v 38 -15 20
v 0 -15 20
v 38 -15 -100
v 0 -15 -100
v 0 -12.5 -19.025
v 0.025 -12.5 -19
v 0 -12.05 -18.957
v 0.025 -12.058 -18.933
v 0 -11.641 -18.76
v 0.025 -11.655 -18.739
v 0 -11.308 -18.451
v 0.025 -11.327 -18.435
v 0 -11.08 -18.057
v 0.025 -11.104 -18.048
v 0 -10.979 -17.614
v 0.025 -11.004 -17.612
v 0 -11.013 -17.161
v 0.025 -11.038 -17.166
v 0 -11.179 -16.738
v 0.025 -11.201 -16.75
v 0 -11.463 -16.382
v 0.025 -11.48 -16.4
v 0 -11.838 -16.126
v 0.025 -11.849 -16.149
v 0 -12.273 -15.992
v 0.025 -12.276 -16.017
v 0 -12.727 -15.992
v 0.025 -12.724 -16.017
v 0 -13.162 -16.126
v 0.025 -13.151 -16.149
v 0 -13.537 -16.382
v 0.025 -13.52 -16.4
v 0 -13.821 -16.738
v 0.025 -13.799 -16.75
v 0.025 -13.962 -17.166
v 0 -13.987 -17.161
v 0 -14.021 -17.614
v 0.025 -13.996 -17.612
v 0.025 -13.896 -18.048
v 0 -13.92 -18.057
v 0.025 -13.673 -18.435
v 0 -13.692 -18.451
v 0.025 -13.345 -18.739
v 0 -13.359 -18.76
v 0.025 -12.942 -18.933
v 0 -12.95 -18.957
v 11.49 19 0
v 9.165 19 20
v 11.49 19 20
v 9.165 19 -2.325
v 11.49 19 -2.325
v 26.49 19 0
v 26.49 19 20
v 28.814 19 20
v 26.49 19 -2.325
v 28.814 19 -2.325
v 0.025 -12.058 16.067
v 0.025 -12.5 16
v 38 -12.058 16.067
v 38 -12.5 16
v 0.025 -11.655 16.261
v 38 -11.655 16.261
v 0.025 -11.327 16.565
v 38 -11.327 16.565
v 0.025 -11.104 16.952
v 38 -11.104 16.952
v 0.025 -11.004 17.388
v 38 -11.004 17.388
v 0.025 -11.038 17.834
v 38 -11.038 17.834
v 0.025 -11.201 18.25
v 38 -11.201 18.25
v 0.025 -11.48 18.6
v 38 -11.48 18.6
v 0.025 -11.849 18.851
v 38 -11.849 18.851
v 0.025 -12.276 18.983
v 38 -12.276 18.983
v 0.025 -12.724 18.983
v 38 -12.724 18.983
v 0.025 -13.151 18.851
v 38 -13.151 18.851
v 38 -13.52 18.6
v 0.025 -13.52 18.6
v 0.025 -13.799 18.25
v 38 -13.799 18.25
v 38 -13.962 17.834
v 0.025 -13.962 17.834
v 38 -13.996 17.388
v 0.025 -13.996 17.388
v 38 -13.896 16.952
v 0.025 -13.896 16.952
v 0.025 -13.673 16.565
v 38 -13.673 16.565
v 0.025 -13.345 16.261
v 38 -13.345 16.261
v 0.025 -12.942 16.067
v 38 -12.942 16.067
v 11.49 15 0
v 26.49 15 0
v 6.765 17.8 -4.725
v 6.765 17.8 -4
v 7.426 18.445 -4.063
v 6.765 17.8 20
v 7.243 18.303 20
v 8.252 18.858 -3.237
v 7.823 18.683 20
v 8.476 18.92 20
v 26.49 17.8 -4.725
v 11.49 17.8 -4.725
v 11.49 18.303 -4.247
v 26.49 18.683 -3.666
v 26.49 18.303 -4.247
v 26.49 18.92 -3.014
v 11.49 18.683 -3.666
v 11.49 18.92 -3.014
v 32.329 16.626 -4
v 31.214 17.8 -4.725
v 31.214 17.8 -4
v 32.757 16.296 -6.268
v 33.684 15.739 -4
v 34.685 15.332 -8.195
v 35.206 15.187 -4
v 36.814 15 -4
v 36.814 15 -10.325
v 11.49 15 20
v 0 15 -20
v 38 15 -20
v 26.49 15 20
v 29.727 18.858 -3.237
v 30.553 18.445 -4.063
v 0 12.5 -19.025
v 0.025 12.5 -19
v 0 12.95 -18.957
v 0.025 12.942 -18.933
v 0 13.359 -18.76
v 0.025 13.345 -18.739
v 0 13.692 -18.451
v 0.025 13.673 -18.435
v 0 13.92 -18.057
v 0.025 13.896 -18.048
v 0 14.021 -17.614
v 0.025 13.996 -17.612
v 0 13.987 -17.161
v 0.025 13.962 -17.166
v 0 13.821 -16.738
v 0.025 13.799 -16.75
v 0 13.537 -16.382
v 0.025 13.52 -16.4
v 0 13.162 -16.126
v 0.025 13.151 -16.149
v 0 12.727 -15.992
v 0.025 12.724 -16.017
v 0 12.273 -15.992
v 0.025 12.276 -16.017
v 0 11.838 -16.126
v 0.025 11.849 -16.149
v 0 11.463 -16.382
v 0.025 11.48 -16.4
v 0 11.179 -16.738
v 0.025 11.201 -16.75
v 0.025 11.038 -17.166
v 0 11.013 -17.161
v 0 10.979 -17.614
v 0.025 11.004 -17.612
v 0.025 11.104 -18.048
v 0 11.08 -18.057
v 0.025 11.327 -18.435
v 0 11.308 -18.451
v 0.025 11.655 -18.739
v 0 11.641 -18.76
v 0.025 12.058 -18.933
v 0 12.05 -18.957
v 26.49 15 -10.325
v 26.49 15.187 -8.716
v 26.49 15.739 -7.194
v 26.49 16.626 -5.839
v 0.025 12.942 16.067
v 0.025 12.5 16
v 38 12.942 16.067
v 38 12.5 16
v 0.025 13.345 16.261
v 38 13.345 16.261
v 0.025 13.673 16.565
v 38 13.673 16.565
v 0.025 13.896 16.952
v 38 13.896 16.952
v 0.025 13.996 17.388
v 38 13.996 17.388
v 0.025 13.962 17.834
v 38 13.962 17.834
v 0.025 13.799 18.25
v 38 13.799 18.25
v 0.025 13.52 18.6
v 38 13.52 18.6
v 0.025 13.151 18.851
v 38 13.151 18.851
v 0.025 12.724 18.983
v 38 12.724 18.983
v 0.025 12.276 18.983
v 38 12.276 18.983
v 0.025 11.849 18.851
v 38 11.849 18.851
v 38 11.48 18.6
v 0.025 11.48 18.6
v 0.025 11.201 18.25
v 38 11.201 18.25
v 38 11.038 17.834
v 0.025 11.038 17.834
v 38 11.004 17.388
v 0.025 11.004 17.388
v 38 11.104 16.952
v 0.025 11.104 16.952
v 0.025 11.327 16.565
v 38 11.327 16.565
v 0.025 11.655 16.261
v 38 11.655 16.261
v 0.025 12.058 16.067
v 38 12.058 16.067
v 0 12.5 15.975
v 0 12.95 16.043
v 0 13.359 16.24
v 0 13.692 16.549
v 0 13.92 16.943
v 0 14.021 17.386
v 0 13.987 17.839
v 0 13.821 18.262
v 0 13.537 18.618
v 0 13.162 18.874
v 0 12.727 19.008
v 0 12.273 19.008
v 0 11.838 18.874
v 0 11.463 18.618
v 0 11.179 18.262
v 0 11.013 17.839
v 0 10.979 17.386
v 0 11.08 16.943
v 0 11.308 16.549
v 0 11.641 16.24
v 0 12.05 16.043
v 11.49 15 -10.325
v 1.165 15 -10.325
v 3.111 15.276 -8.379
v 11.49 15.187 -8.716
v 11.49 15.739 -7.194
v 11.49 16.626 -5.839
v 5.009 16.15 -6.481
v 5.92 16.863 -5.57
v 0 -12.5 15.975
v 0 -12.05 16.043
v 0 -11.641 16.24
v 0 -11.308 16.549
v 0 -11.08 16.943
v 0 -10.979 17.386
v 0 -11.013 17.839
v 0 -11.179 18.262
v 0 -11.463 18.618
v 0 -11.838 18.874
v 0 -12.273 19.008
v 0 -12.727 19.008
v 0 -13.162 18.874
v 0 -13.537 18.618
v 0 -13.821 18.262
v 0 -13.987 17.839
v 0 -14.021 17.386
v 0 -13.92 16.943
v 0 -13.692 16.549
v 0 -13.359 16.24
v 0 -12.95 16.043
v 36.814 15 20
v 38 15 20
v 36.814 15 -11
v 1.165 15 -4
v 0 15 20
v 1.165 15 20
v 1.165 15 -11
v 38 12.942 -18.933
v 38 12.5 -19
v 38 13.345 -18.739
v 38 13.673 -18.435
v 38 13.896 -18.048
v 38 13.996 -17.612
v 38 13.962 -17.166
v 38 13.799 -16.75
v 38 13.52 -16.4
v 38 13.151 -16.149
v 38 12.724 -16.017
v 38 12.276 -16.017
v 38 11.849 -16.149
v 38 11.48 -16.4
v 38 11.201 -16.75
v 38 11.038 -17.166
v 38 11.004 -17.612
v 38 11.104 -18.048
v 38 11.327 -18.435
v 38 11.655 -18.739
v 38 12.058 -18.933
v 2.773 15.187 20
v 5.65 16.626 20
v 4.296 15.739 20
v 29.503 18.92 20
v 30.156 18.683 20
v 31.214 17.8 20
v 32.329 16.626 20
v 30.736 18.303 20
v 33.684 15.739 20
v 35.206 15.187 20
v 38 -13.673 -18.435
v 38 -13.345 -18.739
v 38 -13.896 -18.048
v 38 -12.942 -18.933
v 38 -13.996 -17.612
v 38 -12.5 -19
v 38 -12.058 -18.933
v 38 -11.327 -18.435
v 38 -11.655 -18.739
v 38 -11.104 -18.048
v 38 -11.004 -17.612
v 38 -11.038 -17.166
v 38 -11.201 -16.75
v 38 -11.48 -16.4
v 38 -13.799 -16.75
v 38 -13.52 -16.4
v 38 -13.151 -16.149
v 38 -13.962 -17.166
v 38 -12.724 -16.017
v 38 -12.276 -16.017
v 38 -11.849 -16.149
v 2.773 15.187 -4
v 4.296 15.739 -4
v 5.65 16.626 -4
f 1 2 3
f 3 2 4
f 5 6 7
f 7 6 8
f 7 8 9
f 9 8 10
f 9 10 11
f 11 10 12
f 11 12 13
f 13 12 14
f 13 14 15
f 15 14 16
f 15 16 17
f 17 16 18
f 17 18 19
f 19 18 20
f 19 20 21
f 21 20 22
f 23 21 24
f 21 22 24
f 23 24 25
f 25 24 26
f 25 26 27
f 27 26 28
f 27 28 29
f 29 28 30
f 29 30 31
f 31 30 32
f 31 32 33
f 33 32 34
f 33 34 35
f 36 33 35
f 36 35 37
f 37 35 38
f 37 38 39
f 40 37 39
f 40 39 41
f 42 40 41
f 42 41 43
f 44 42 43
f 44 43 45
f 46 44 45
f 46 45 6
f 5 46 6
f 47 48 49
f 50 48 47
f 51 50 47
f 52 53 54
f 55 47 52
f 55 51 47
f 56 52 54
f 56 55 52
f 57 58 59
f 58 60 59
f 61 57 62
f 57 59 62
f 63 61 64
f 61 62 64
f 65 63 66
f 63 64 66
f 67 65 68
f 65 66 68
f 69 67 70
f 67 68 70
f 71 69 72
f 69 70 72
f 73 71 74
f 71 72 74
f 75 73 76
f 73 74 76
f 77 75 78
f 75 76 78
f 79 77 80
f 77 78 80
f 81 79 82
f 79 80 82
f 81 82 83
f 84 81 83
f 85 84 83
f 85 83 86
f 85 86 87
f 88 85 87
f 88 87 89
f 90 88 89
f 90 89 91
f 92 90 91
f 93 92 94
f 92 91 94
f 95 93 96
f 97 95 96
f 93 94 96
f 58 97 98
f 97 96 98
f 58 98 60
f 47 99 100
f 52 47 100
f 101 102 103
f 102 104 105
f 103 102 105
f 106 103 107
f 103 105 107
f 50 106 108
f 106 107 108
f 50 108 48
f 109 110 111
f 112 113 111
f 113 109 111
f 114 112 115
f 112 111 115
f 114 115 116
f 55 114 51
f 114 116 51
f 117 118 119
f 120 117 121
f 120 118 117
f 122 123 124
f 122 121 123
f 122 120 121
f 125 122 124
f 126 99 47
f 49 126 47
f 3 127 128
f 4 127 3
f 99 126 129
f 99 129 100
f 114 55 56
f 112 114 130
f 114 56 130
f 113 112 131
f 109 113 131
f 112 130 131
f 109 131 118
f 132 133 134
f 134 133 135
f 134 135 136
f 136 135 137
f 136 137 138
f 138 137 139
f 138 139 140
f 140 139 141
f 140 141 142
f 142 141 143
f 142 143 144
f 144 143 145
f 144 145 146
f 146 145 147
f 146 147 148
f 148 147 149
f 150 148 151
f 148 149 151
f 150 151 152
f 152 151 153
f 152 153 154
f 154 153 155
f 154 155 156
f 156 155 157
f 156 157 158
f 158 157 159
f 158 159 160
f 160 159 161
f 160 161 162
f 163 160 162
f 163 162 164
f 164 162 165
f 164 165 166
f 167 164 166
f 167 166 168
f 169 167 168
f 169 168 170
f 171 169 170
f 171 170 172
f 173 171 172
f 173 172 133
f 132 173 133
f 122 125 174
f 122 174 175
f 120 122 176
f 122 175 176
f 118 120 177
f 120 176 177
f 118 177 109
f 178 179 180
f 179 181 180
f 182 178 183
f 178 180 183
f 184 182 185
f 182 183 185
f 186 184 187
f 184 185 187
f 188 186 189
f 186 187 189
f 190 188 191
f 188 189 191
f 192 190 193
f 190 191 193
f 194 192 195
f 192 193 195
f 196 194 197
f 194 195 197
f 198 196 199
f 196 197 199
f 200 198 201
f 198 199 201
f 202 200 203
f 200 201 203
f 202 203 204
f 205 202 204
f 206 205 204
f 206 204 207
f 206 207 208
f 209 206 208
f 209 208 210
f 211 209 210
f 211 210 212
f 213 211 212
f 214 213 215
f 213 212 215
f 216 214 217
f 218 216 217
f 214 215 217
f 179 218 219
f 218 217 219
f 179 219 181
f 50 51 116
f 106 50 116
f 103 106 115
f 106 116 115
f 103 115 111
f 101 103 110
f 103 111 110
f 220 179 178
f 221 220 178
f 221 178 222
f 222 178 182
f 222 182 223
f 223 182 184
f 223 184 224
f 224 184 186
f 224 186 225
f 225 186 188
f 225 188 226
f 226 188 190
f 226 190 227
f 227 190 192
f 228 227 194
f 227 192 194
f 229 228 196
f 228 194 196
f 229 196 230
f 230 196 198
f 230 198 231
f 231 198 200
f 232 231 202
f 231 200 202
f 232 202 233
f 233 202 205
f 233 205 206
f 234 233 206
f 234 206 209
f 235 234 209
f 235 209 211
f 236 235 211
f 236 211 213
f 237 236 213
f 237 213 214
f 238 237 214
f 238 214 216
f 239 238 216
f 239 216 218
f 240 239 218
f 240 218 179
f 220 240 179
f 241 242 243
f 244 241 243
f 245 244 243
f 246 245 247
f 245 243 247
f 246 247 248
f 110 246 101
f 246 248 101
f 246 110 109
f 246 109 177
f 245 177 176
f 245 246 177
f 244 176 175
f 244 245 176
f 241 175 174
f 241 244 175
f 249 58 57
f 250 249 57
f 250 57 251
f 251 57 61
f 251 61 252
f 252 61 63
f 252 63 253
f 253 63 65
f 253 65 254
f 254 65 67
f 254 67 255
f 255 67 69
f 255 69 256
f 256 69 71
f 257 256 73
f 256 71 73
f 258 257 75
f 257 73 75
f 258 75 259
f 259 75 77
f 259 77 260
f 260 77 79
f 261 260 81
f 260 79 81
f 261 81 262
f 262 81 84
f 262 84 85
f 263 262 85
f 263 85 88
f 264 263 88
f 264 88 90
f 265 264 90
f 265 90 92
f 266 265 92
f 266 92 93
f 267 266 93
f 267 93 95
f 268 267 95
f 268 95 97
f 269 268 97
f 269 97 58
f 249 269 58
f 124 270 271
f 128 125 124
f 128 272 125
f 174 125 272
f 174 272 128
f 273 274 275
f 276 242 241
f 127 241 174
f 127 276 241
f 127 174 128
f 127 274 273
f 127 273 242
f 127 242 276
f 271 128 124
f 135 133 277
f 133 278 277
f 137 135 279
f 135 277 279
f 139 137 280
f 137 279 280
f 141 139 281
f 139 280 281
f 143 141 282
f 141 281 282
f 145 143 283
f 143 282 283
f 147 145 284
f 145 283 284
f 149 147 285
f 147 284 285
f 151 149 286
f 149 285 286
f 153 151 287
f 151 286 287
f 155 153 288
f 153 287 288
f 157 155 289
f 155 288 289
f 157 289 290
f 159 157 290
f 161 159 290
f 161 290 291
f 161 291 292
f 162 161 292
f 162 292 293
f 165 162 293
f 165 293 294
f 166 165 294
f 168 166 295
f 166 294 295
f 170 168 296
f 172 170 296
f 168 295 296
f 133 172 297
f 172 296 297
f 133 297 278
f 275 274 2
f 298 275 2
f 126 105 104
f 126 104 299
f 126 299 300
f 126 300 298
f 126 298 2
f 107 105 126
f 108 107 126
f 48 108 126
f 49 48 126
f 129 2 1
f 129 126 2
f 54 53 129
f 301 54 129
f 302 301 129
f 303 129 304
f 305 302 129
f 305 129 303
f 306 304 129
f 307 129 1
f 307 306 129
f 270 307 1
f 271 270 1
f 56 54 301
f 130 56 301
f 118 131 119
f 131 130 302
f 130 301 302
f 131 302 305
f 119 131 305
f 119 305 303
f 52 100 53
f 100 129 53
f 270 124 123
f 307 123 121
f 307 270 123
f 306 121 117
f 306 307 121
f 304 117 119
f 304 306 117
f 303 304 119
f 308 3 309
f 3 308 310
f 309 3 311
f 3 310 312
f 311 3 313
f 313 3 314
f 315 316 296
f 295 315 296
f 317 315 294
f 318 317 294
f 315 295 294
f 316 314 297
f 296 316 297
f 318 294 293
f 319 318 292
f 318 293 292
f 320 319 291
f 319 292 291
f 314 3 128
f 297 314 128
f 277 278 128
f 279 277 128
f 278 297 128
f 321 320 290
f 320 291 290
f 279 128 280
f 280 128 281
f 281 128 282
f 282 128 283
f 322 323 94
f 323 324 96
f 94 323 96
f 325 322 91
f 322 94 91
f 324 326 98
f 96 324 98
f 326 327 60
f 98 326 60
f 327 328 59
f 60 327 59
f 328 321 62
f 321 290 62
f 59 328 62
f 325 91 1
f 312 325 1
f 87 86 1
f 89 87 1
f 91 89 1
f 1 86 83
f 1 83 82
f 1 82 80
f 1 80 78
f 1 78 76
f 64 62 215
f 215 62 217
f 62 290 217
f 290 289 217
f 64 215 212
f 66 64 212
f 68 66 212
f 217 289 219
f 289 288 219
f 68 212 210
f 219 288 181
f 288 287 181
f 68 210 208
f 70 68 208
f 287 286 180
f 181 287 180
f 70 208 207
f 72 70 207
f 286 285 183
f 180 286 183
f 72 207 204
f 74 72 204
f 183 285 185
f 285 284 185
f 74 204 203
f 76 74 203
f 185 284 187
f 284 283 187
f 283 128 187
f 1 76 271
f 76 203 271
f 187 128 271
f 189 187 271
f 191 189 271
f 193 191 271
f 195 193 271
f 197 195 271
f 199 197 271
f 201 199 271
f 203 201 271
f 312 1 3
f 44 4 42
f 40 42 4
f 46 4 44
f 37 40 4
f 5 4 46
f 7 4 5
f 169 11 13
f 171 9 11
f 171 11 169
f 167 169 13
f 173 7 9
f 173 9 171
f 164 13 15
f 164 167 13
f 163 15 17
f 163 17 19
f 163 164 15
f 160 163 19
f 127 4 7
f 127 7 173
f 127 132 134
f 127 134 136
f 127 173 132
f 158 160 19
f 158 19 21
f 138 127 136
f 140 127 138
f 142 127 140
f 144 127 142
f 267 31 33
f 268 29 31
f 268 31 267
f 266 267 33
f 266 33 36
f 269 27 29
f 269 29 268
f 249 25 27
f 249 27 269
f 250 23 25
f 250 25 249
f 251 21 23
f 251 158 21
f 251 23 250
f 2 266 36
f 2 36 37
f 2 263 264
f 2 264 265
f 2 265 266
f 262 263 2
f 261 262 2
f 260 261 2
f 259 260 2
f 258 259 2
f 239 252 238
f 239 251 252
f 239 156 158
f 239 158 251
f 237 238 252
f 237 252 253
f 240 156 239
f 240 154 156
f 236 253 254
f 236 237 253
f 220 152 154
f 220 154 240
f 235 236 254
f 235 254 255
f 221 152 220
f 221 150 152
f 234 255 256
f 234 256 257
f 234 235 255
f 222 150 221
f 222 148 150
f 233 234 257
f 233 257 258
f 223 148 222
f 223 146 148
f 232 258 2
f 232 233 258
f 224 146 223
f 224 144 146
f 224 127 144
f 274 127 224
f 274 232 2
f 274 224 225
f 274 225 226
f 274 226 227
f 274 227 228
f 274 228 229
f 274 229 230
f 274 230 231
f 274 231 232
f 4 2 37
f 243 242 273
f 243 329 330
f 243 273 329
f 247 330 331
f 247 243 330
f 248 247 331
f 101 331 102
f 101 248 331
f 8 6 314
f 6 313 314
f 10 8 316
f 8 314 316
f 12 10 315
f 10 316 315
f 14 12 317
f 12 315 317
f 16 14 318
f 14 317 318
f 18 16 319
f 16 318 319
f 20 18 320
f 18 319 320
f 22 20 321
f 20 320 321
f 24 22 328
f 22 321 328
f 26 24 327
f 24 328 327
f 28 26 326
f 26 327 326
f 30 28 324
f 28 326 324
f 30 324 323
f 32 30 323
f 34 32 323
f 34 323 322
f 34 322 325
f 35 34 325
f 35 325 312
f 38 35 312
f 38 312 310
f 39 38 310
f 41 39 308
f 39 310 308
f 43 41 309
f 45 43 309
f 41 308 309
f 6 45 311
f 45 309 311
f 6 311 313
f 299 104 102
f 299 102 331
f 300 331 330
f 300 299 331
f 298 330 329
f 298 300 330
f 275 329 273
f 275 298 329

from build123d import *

# Parameters (mm, degrees)
BOSS_EXTRUDE1_DEPTH                = 38
F_3_0_3_DIAMETER_HOLE1_D           = 3
F_3_0_3_DIAMETER_HOLE1_CSINK_D     = 3.05
F_3_0_3_DIAMETER_HOLE1_CSINK_ANGLE = 90
SKETCH6_W                          = 4
SKETCH6_H                          = 4
BOSS_EXTRUDE2_DEPTH                = 24
FILLET2_R                          = 7
FILLET3_START                      = 7.489649075
FILLET3_DEPTH                      = 4
FILLET3_START_2                    = 26.489649075
FILLET3_2_DEPTH                    = 4
FILLET3_START_3                    = 1.165093755
FILLET3_3_DEPTH                    = 6.32455532
FILLET3_START_4                    = 30.489649075
FILLET3_4_DEPTH                    = 6.324555321
FILLET3_START_5                    = -11
FILLET3_5_DEPTH                    = 7
SKETCH7_W                          = 15
SKETCH7_H                          = 4
BOSS_EXTRUDE3_DEPTH                = 4
FILLET4_R                          = 7
FILLET5_R                          = 3


with BuildPart() as part:
    # Sketch1 → Boss-Extrude1 (new body)
    with BuildSketch(Plane(origin=(0, 0, 0), x_dir=(0, 0, -1), z_dir=(1, 0, 0))):
        Polygon((-20, 15), (20, 15), (100, -15), (20, -15), (-20, -15), align=None)
    extrude(amount=BOSS_EXTRUDE1_DEPTH)

    # Ø3.0 (3) Diameter Hole1 (through all)
    with Locations(Plane.ZY):
        with Locations((17.5, 12.5), (-17.5, 12.5), (-17.5, -12.5), (17.5, -12.5)):
            CounterSinkHole(F_3_0_3_DIAMETER_HOLE1_D / 2, F_3_0_3_DIAMETER_HOLE1_CSINK_D / 2, counter_sink_angle=F_3_0_3_DIAMETER_HOLE1_CSINK_ANGLE)

    # Sketch6 → Boss-Extrude2 (add)
    with BuildSketch(Plane.XY.offset(20)):
        with Locations((9.489649075, 17)):
            Rectangle(SKETCH6_W, SKETCH6_H)
        with Locations((28.489649075, 17)):
            Rectangle(SKETCH6_W, SKETCH6_H)
    extrude(amount=-BOSS_EXTRUDE2_DEPTH)

    # Fillet2
    # the kernel refuses this fillet: 7 mm, written as the material it adds along each edge
    with BuildSketch(Plane(origin=(30.489649075, 15, 20), x_dir=(1, 0, 0), z_dir=(0, 0, -1))) as fillet2_piece_1:
        with BuildLine():
            CenterArc((6.32455532, -7), FILLET2_R, 90, 64.623066475)
            Line((0, -4), (-0.126491106, -3.94))
            ThreePointArc((-0.126491106, -3.94), (-0.14, -2), (-0.14, 0))
            Line((-0.14, 0), (0, 0.14))
            Line((0, 0.14), (6.32455532, 0.14))
            Line((6.32455532, 0.14), (6.32455532, 0))
        make_face()
    extrude(amount=24)
    with BuildSketch(Plane(origin=(7.489649075, 15, 20), x_dir=(-1, 0, 0), z_dir=(0, 0, -1))) as fillet2_piece_2:
        with BuildLine():
            CenterArc((6.32455532, 7), FILLET2_R, 205.376933525, 64.623066475)
            Line((0, 4), (-0.126491106, 3.94))
            ThreePointArc((-0.126491106, 3.94), (-0.14, 2), (-0.14, 0))
            Line((-0.14, 0), (0, -0.14))
            Line((0, -0.14), (6.32455532, -0.14))
            Line((6.32455532, -0.14), (6.32455532, 0))
        make_face()
    extrude(amount=24)

    # Fillet3: read off the stored shape, not the designer's step
    # Fillet3 outline → Fillet3 (add)
    with BuildSketch(Plane.YZ.offset(FILLET3_START)):
        with BuildLine():
            Line((15, -4), (15, -10.32455532))
            ThreePointArc((15, -10.32455532), (16.083920217, -6.582897934), (19, -4))
            Line((19, -4), (15, -4))
        make_face()
    extrude(amount=FILLET3_DEPTH)

    # Fillet3 2 outline → Fillet3 2 (add)
    with BuildSketch(Plane.YZ.offset(FILLET3_START_2)):
        with BuildLine():
            Line((15, -4), (15, -10.32455532))
            ThreePointArc((15, -10.32455532), (16.083920217, -6.582897934), (19, -4))
            Line((19, -4), (15, -4))
        make_face()
    extrude(amount=FILLET3_2_DEPTH)

    # Fillet3 3 outline → Fillet3 3 (add)
    with BuildSketch(Plane.YZ.offset(FILLET3_START_3)):
        with BuildLine():
            Line((15, -4), (15, -10.32455532))
            ThreePointArc((15, -10.32455532), (16.083920217, -6.582897934), (19, -4))
            Line((19, -4), (15, -4))
        make_face()
    extrude(amount=FILLET3_3_DEPTH)

    # Fillet3 4 outline → Fillet3 4 (add)
    with BuildSketch(Plane.YZ.offset(FILLET3_START_4)):
        with BuildLine():
            Line((15, -4), (15, -10.32455532))
            ThreePointArc((15, -10.32455532), (16.083920217, -6.582897934), (19, -4))
            Line((19, -4), (15, -4))
        make_face()
    extrude(amount=FILLET3_4_DEPTH)

    # Fillet3 5 outline → Fillet3 5 (cut)
    with BuildSketch(Plane.XY.offset(FILLET3_START_5)):
        with BuildLine():
            Line((30.015307426, 20), (30.489649075, 19))
            ThreePointArc((30.489649075, 19), (33.072547009, 16.083920217), (36.814204396, 15))
            Line((36.814204396, 15), (36.814204396, 20))
            Line((36.814204396, 20), (30.015307426, 20))
        make_face()
        with BuildLine():
            Line((7.489649075, 19), (7.963990724, 20))
            Line((7.963990724, 20), (1.165093755, 20))
            Line((1.165093755, 20), (1.165093755, 15))
            ThreePointArc((1.165093755, 15), (4.906751142, 16.083920217), (7.489649075, 19))
        make_face()
    extrude(amount=FILLET3_5_DEPTH, mode=Mode.SUBTRACT)

    # Sketch7 → Boss-Extrude3 (add)
    with BuildSketch(Plane(origin=(0, 15, 0), x_dir=(1, 0, 0), z_dir=(0, 1, 0))):
        with Locations((18.989649075, 2)):
            Rectangle(SKETCH7_W, SKETCH7_H)
    extrude(amount=BOSS_EXTRUDE3_DEPTH)

    # Fillet4
    # the kernel refuses this fillet: 7 mm, written as the material it adds along each edge
    with BuildSketch(Plane(origin=(11.489649075, 15, -4), x_dir=(0, 0, -1), z_dir=(1, 0, 0))) as fillet4_piece_1:
        with BuildLine():
            CenterArc((6.32455532, 7), FILLET4_R, 205.376933525, 64.623066475)
            Line((0, 4), (-0.126491106, 3.94))
            ThreePointArc((-0.126491106, 3.94), (-0.14, 2), (-0.14, 0))
            Line((-0.14, 0), (0, -0.14))
            Line((0, -0.14), (6.32455532, -0.14))
            Line((6.32455532, -0.14), (6.32455532, 0))
        make_face()
    extrude(amount=15)

    # Fillet5
    # the kernel refuses this fillet: 3 mm, written as the material it takes off along each edge
    with BuildSketch(Plane(origin=(30.489649075, 19, 24.188611699), x_dir=(-1, 0, 0), z_dir=(0, 0, -1))) as fillet5_piece_1:
        with BuildLine():
            CenterArc((1.67544468, -3), FILLET5_R, 90, 53.130102354)
            ThreePointArc((-0.72455532, -1.2), (-0.332163903, -0.618182569), (0, 0))
            Line((0, 0), (1.67544468, 0))
        make_face()
    extrude(amount=32.377223398, mode=Mode.SUBTRACT)
    with BuildSketch(Plane(origin=(34.678260774, 19, -4), x_dir=(0, 0, 1), z_dir=(-1, 0, 0)), Plane(origin=(11.489649075, 19, -4), x_dir=(0, 0, 1), z_dir=(-1, 0, 0))) as fillet5_piece_2:
        with BuildLine():
            CenterArc((1.675444679, -3), FILLET5_R, 90, 53.130102349)
            ThreePointArc((-0.72455532, -1.2), (-0.332163903, -0.618182569), (0, 0))
            Line((0, 0), (1.675444679, 0))
        make_face()
    extrude(amount=8.188611699, mode=Mode.SUBTRACT)
    with BuildSketch(Plane(origin=(11.489649075, 19, -4), x_dir=(0, -0.8560559167430235, -0.5168832241515113), z_dir=(1, 0, 0))) as fillet5_piece_3:
        with BuildLine():
            CenterArc((1.702158502, -2.984924004), FILLET5_R, 95.74648206, 53.130102354)
            Line((-0.866009248, -1.434274331), (0, 0))
            ThreePointArc((0, 0), (0.700888795, -0.035177325), (1.40177759, 0))
        make_face()
    extrude(amount=15, mode=Mode.SUBTRACT)
    with BuildSketch(Plane(origin=(7.489649075, 19, 24.188611699), x_dir=(1, 0, 0), z_dir=(0, 0, -1))) as fillet5_piece_4:
        with BuildLine():
            CenterArc((1.67544468, 3), FILLET5_R, 216.869897646, 53.130102354)
            ThreePointArc((-0.72455532, 1.2), (-0.332163903, 0.618182569), (0, 0))
            Line((0, 0), (1.67544468, 0))
        make_face()
    extrude(amount=32.377223398, mode=Mode.SUBTRACT)


solid = part.part
